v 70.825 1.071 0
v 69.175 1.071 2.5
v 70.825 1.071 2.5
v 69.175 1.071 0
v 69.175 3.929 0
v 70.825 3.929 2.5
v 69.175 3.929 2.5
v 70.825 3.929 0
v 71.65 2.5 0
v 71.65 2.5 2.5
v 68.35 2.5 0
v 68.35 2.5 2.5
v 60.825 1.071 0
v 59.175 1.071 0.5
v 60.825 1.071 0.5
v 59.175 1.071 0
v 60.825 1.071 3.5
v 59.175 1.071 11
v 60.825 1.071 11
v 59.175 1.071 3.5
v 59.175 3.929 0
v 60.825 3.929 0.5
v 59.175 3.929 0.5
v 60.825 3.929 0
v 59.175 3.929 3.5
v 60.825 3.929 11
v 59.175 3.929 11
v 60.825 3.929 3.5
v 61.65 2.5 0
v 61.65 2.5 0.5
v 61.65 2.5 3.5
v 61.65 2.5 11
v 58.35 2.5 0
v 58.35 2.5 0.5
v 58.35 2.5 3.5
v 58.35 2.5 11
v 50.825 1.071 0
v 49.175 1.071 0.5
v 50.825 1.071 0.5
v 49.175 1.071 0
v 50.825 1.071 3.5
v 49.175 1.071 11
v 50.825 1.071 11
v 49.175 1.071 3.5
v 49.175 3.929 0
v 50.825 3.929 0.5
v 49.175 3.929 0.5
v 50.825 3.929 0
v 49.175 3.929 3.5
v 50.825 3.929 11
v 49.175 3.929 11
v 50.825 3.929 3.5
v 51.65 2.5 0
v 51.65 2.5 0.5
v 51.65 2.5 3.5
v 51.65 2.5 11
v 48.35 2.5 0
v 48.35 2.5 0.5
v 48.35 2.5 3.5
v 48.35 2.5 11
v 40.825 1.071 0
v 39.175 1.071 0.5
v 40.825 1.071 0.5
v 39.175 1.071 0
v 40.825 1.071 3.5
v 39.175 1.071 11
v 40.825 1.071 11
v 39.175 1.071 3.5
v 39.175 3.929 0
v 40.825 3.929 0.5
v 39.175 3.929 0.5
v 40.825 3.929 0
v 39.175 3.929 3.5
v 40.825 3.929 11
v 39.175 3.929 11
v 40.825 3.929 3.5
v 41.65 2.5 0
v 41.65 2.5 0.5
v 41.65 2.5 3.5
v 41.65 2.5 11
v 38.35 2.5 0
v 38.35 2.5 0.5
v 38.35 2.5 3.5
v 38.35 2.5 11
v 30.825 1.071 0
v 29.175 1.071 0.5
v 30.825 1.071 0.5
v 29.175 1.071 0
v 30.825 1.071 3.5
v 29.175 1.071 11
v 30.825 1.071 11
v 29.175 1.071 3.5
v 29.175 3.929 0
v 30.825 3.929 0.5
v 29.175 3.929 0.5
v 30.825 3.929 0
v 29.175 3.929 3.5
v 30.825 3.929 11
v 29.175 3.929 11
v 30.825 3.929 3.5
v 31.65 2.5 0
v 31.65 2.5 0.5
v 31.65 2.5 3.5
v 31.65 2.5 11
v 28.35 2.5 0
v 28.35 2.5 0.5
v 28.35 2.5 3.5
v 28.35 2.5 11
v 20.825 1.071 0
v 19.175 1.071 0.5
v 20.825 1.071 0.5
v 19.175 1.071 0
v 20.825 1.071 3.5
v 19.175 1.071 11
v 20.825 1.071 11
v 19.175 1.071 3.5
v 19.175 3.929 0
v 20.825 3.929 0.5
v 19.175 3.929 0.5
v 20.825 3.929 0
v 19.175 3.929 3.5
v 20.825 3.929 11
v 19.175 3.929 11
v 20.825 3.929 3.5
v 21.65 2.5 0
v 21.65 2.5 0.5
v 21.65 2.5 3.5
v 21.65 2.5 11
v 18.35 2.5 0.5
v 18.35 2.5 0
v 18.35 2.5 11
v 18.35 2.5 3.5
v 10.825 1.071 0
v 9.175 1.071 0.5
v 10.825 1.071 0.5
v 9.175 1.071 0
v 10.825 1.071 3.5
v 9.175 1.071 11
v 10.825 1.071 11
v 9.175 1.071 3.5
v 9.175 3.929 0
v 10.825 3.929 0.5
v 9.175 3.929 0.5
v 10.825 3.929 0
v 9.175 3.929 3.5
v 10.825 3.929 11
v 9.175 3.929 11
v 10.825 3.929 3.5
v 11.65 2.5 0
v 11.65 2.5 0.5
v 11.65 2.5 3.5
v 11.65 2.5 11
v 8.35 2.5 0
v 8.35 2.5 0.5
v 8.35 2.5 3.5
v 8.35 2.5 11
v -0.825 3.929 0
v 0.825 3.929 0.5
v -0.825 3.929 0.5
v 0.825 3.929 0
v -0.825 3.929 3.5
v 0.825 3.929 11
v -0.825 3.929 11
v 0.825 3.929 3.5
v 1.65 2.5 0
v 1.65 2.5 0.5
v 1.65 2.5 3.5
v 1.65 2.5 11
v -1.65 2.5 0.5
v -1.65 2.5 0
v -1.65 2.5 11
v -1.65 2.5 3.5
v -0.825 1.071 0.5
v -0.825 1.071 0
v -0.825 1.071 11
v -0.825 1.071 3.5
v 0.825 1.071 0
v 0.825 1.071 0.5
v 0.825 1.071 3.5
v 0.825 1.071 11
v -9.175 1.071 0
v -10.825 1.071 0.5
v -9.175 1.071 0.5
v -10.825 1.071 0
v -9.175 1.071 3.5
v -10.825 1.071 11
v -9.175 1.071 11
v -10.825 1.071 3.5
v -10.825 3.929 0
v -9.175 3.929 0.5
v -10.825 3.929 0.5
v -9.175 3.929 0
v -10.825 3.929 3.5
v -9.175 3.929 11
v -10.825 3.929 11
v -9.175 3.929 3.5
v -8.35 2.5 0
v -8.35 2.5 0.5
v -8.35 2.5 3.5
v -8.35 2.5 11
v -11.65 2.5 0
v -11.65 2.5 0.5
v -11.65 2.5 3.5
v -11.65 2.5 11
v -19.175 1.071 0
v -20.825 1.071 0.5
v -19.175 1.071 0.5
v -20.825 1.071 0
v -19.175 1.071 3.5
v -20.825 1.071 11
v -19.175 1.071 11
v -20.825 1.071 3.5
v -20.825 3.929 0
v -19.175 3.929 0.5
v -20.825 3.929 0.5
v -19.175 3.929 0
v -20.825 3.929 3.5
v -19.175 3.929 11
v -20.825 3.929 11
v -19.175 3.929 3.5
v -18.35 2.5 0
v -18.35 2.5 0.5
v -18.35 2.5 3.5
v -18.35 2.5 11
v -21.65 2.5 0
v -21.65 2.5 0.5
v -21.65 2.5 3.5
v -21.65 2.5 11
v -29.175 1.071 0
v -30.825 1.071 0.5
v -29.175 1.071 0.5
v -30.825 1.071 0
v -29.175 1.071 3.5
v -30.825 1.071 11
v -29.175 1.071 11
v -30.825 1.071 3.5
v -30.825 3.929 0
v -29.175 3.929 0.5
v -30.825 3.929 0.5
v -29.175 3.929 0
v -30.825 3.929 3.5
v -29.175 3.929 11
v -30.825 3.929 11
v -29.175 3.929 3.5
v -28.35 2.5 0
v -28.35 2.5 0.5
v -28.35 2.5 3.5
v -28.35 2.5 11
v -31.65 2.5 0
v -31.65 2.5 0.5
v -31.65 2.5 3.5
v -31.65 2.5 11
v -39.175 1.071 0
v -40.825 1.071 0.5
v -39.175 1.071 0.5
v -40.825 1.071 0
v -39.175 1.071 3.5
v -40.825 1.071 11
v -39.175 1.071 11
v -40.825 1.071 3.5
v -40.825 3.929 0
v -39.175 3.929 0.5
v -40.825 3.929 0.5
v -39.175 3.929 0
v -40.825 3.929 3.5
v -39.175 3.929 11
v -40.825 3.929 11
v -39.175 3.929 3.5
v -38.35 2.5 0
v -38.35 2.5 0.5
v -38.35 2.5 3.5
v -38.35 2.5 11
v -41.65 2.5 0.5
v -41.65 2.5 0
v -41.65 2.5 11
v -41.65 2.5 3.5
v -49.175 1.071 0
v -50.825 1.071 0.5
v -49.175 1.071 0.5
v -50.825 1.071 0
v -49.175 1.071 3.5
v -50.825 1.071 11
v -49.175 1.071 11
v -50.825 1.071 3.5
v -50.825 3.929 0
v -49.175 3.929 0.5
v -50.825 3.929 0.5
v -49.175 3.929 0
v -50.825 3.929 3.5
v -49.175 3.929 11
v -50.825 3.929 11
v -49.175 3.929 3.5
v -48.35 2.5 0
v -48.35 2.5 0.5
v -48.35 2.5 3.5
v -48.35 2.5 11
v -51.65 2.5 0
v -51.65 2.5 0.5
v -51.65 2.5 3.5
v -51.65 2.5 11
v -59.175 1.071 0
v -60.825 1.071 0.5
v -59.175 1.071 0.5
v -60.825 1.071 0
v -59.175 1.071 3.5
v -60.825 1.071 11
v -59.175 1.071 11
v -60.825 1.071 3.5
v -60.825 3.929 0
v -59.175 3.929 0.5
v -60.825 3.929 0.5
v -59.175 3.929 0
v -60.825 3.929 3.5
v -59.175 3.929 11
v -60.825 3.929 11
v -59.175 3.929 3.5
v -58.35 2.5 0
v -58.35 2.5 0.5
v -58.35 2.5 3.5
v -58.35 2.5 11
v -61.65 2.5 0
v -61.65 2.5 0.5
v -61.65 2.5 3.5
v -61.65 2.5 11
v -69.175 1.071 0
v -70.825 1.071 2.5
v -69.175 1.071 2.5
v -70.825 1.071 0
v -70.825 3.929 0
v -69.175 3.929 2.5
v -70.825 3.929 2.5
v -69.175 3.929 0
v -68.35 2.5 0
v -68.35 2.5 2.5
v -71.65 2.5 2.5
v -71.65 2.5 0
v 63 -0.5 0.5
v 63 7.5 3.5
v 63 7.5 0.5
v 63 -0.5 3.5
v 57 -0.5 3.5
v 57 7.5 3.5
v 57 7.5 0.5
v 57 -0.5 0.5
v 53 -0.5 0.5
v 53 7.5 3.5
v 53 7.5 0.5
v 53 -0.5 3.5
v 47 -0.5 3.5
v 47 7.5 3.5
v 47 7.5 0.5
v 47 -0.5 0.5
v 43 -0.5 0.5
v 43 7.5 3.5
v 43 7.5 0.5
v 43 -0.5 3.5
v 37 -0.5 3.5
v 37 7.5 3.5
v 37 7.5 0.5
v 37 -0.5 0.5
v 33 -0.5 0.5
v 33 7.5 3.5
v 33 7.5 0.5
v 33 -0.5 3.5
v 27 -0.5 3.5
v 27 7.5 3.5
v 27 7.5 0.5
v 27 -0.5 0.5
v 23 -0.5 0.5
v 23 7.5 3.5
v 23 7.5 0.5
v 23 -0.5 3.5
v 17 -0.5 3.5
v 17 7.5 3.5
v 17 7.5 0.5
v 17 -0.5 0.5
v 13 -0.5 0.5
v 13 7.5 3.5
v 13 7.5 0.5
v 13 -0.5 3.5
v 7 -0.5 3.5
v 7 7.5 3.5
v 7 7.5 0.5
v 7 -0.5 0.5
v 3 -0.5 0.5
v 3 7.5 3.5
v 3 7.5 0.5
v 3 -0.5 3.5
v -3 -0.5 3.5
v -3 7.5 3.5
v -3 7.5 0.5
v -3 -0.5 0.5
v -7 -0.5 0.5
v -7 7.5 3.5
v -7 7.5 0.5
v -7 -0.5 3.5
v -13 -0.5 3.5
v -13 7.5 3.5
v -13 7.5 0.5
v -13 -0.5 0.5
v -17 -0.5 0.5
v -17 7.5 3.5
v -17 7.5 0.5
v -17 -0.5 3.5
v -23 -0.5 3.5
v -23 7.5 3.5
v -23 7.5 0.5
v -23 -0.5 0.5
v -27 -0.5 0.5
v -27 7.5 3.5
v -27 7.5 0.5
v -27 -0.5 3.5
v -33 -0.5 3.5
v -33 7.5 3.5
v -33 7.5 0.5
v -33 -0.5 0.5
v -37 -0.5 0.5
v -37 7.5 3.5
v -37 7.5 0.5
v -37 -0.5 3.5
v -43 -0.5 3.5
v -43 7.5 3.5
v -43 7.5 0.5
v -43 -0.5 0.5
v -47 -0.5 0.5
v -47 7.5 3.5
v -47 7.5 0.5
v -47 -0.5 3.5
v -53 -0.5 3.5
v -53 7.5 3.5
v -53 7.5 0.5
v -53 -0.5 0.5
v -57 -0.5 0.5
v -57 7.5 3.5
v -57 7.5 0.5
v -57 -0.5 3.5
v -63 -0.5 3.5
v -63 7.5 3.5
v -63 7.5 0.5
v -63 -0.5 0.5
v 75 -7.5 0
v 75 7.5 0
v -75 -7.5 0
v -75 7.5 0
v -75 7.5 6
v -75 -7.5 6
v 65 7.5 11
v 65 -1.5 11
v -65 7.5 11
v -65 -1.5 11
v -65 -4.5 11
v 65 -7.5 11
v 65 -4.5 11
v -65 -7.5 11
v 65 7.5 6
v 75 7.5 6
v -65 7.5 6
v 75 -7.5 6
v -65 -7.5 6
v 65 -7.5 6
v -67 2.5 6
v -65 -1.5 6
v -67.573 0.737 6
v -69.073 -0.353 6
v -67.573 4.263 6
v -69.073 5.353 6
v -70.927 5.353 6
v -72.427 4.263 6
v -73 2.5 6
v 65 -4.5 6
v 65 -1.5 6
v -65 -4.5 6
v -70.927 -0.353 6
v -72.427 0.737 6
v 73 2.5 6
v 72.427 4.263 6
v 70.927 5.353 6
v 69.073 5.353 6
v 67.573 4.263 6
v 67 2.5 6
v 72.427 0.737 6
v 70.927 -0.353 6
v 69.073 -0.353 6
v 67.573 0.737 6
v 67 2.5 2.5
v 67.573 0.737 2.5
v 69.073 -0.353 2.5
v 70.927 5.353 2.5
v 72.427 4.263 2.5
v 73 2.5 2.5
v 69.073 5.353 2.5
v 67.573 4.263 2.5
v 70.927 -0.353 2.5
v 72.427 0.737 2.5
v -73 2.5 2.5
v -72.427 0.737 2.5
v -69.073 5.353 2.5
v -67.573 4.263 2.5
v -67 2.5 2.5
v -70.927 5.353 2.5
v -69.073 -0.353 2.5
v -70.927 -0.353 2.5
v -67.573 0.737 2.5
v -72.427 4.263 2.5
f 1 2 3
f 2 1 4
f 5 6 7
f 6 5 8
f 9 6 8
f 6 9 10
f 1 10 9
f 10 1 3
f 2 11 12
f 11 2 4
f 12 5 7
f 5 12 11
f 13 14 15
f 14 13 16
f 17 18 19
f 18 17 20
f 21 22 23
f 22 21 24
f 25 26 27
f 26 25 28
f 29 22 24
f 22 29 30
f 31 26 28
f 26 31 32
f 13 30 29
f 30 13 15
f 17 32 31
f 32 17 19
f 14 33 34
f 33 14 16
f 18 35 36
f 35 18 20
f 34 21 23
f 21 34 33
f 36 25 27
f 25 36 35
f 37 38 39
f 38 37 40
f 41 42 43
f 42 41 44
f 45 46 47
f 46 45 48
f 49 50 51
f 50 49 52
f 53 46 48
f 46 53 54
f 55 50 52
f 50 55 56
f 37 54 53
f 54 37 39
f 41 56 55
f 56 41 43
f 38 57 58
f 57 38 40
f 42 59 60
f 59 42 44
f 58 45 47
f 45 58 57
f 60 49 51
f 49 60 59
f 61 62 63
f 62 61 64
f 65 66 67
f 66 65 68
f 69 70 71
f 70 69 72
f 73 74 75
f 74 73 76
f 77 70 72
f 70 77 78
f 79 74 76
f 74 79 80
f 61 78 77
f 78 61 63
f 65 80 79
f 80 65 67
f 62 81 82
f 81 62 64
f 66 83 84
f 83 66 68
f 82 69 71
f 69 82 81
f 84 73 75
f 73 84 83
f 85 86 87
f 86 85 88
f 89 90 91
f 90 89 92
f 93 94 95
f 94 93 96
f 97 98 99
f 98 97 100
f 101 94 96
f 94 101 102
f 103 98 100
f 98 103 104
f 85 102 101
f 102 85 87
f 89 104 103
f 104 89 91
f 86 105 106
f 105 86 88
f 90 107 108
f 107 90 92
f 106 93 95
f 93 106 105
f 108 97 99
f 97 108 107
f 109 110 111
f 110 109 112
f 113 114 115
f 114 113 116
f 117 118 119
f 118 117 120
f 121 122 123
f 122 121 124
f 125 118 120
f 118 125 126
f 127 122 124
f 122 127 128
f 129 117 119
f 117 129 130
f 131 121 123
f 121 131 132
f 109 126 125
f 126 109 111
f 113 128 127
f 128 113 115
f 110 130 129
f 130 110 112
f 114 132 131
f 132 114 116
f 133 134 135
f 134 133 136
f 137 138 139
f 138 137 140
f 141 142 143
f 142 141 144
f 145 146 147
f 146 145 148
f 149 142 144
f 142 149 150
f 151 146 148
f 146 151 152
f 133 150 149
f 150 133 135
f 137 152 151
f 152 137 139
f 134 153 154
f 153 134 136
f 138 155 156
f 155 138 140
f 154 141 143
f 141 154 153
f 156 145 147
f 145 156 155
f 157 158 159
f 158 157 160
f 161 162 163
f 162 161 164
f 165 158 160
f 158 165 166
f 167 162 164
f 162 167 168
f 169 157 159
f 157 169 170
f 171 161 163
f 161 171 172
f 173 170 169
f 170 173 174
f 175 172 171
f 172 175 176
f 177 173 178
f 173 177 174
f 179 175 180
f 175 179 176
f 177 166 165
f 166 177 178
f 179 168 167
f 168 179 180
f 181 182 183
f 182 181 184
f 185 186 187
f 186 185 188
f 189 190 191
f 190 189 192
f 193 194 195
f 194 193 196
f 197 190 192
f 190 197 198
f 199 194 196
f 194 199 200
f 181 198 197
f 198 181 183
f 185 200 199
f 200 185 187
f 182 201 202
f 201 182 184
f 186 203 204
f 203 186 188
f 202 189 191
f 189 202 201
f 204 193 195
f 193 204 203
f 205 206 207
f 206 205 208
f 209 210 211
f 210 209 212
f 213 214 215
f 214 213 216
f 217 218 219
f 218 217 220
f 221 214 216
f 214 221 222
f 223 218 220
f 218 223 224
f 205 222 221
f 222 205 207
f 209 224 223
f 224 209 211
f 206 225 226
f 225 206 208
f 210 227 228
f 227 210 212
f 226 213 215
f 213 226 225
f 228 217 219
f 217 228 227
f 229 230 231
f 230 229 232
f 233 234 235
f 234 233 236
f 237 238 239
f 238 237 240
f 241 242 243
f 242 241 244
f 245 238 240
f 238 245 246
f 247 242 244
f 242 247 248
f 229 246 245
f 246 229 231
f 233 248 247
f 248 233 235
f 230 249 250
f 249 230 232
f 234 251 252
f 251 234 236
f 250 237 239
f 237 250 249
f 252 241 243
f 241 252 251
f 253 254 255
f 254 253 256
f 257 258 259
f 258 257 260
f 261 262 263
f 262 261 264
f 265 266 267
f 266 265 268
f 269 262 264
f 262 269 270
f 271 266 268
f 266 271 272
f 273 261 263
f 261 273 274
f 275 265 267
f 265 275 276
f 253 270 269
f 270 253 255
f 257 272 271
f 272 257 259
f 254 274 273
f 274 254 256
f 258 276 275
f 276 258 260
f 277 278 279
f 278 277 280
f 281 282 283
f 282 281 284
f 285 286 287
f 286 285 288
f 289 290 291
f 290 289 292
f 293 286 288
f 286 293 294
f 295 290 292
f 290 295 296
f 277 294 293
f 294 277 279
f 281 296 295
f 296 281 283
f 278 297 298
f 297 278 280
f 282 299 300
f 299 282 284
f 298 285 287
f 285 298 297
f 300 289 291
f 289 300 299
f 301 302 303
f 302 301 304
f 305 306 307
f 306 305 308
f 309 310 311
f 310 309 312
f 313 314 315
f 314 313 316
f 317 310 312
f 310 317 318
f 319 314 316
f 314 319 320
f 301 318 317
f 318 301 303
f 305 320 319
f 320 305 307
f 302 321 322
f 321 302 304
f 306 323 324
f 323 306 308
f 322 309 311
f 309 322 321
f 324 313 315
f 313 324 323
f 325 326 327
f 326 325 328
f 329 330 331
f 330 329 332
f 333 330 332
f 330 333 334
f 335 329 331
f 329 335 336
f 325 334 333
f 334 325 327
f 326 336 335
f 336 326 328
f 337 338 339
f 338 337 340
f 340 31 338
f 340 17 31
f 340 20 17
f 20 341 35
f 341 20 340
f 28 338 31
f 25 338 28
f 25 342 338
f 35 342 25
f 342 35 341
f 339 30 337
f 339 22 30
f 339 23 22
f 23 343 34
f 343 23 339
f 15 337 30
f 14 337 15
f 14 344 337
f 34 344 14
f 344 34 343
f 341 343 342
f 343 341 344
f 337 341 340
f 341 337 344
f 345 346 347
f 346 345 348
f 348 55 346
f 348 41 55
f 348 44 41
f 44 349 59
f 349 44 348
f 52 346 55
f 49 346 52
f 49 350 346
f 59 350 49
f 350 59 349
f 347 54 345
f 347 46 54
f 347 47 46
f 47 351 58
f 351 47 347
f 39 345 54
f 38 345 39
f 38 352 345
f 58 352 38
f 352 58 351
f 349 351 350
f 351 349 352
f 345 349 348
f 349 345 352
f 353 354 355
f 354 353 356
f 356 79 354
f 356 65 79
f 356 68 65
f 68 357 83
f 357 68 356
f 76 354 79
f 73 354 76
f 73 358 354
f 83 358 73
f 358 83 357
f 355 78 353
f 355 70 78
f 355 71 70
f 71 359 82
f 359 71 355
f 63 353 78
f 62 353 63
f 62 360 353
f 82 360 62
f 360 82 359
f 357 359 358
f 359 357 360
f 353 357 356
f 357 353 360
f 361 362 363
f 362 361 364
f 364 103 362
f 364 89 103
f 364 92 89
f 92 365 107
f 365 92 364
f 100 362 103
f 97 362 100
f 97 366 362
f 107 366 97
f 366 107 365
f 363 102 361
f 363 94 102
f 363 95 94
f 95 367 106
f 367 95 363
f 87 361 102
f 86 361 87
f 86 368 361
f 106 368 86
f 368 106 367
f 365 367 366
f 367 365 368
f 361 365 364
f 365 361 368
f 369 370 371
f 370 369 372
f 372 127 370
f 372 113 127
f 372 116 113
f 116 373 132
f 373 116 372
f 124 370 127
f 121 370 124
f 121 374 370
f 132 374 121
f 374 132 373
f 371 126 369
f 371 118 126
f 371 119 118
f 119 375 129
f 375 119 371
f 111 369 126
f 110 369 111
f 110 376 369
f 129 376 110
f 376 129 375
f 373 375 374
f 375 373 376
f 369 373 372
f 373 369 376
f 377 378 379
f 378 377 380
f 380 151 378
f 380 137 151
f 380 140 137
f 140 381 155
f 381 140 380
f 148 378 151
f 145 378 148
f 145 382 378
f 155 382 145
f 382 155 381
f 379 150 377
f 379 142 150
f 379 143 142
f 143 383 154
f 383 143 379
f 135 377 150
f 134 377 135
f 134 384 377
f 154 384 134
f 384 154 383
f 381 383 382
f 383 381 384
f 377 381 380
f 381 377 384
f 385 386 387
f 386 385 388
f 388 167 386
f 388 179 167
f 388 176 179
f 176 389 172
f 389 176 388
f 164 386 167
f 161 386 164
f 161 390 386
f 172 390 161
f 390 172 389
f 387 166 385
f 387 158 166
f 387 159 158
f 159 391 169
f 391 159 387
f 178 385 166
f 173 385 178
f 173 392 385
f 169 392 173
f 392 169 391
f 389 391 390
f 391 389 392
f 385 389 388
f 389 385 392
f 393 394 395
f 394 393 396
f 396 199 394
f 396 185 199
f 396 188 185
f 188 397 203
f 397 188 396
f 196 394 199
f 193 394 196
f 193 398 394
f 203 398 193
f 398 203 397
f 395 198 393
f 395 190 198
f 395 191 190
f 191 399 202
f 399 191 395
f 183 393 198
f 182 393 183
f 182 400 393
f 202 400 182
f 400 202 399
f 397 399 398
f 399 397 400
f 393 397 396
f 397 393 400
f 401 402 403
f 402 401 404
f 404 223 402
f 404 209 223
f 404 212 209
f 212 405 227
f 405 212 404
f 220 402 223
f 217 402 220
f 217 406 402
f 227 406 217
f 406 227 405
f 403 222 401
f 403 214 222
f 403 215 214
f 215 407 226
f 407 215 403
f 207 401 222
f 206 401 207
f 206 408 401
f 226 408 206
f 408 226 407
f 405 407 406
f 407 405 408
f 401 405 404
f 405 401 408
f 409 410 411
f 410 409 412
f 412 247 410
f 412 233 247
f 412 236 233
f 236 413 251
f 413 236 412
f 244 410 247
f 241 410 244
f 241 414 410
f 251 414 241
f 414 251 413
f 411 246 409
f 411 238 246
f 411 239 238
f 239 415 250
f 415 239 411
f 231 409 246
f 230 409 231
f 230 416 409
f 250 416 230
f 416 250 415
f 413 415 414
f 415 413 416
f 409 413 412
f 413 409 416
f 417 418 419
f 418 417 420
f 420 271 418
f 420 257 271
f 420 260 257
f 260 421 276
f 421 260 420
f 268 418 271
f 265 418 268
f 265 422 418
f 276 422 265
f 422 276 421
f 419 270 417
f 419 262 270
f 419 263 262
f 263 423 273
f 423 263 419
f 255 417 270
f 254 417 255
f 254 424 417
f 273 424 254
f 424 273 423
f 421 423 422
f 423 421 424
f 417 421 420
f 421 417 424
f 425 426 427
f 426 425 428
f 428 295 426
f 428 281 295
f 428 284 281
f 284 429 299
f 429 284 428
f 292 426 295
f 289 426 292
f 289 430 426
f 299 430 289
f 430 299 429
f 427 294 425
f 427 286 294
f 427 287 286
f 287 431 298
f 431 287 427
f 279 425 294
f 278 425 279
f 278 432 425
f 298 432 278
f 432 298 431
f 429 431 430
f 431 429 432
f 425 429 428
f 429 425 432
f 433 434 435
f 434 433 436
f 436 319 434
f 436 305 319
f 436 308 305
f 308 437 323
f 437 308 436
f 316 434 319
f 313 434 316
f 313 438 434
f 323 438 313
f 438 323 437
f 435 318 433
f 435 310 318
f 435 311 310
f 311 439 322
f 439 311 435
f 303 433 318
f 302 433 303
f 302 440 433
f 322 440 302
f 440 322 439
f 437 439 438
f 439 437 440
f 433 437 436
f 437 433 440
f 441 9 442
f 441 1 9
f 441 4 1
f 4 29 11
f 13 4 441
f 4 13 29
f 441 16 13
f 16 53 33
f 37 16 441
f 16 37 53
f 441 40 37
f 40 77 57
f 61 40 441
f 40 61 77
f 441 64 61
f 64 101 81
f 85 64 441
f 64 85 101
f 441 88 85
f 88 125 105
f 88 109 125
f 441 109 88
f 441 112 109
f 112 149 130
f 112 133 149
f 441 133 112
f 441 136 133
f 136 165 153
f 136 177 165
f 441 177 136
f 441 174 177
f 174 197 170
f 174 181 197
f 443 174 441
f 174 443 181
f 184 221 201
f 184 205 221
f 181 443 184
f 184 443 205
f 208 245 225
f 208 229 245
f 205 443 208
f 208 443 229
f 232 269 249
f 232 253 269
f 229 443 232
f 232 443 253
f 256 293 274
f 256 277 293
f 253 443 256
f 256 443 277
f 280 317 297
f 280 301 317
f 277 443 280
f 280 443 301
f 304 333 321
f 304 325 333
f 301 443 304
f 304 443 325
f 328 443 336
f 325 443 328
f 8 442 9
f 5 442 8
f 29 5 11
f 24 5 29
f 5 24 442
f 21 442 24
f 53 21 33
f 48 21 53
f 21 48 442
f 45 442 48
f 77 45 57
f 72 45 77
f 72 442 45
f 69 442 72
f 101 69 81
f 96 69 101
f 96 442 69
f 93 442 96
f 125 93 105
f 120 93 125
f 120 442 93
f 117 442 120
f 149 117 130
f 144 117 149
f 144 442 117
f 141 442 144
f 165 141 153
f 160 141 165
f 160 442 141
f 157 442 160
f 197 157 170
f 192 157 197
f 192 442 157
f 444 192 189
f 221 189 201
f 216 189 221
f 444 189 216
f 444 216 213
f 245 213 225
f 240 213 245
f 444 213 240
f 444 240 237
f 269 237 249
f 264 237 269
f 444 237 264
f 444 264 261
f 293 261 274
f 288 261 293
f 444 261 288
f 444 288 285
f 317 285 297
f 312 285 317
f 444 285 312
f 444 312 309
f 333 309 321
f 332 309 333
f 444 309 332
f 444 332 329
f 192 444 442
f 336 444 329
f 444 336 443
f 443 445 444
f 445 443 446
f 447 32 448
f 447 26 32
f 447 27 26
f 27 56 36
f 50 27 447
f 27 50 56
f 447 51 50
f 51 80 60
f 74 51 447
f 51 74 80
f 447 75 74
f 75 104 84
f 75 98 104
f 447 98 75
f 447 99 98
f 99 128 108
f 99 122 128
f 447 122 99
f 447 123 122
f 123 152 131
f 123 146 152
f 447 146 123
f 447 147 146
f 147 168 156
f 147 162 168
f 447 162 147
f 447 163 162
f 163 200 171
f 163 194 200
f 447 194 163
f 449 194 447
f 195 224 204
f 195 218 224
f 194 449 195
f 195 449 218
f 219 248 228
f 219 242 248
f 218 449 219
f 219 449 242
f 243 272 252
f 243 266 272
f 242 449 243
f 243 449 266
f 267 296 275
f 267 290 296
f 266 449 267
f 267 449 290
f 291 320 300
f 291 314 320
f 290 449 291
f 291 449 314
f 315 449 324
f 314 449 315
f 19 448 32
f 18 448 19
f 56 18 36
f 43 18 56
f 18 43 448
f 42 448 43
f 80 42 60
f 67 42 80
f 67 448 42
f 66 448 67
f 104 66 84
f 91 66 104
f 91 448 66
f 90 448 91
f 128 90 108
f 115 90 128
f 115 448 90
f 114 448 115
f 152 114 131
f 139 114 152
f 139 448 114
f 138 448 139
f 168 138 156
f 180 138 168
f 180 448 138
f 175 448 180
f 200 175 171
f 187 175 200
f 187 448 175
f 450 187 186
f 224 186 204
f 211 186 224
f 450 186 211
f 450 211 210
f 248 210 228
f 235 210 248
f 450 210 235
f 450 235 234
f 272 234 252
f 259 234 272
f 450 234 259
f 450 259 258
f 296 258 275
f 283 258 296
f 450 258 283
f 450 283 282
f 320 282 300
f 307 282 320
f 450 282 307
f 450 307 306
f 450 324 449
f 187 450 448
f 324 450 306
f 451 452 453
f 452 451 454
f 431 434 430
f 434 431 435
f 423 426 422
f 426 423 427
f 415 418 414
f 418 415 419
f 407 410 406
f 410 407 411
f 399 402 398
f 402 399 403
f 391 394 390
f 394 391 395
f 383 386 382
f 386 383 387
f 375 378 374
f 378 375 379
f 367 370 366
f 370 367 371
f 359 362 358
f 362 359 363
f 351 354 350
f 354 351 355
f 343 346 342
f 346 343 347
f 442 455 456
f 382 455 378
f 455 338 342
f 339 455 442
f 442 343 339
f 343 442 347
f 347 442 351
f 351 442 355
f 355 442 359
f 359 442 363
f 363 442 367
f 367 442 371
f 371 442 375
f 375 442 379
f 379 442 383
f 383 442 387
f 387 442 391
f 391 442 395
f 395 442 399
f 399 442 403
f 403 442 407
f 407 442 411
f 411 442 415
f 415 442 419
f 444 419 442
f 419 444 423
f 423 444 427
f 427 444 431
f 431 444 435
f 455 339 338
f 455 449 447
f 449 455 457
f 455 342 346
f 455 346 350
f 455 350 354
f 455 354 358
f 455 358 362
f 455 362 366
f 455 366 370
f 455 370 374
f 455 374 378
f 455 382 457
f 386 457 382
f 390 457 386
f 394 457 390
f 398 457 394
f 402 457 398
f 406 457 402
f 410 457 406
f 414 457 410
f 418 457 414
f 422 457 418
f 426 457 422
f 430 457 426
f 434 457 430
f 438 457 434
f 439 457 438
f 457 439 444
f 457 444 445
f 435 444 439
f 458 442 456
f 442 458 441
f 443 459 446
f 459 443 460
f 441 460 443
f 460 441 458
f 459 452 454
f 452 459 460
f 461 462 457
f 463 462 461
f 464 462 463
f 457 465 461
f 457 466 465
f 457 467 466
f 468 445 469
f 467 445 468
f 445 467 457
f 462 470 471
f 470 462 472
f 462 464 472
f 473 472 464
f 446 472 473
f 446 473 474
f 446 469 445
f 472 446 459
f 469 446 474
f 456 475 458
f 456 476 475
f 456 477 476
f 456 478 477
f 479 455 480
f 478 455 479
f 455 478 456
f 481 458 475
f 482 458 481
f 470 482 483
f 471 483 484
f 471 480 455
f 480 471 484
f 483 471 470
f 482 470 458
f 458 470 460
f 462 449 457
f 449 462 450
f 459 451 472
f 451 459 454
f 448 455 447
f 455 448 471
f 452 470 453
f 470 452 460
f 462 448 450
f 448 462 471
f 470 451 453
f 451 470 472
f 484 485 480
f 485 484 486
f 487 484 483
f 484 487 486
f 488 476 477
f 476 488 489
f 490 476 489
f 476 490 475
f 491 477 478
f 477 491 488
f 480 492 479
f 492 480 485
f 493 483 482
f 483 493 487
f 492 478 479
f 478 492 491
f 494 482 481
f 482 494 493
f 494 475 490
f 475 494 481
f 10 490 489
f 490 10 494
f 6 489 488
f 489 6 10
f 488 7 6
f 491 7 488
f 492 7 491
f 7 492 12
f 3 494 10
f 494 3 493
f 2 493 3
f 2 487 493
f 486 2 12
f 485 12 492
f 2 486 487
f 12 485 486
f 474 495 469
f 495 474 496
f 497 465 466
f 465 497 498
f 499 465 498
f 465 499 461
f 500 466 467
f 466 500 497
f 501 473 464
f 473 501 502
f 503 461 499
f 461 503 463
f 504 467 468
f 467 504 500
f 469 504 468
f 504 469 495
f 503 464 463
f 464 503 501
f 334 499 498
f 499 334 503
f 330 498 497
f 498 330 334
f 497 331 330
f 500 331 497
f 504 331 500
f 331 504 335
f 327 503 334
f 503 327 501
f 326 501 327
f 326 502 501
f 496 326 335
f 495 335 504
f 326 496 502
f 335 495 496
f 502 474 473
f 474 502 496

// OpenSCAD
vzdalenost_der = 10; //rozteč děr mezi sebou
pocet_der = 14; //pocet ter pres ktere je lista ponížené o 1

//rozměry výrezu
//rozmer v ose y
vzdalenost_od_okraje = 10; //vzdalenost stredu upevnovaci diry od kraje desky
vzdalenost_od_diry = 5; //vzdalenost od stredu upevnovaci diry na druhou stranu

//rozmery vyrezu v ose x
vzdalenost_1 = 5; //od díry ke kraji
vzdalenost_2 = 5;

//definicce celkové výšky lišty
zapust=6; //závislé na sloupku
vyska_listy=5;

//parametry pro úžlabinu
tlouska_celicka = 3; //definuje uzlabinu
sirka_materialu = 3; //sirka materialu od kraje desky k uzlabine

//parametry šroubu
vyska_hlavy = 3.5;
prumer_hlavy=6;
prumer_sroubu=3.3;

//parametry matice
prumer_matice=6; //hrany k hraně
vyska_matice=3;  //vyska matice
posuv_dorazu=0;  //pro moznost posuvu dorazu pro vsunutí matice
matice_sila_materialu=2; //sila materialu pod maticí na ose z

difference () {
color("cyan")
    translate([0, 0, 0])
        linear_extrude(height = zapust+vyska_listy)
            square([((pocet_der*vzdalenost_der)+2*vzdalenost_1), vzdalenost_od_okraje+vzdalenost_od_diry], center = true); 
    
    translate([-((((pocet_der*vzdalenost_der)+2*vzdalenost_1)/2)-(vzdalenost_1+vzdalenost_2/2)), 0, (zapust)])
        linear_extrude(height = vyska_listy)
            square([vzdalenost_2, vzdalenost_od_okraje+vzdalenost_od_diry], center = true); 
    
    translate([((((pocet_der*vzdalenost_der)+2*vzdalenost_1)/2)-(vzdalenost_1+vzdalenost_2/2)), 0, (zapust)])
        linear_extrude(height = vyska_listy)
            square([vzdalenost_2, vzdalenost_od_okraje+vzdalenost_od_diry], center = true); 
    
    translate([-((((pocet_der*vzdalenost_der)+2*vzdalenost_1)/2)-(vzdalenost_1/2)), 0, (zapust)])
        linear_extrude(height = vyska_listy)
            square([vzdalenost_1, vzdalenost_od_okraje+vzdalenost_od_diry], center = true); 
    
    translate([((((pocet_der*vzdalenost_der)+2*vzdalenost_1)/2)-(vzdalenost_1/2)), 0, (zapust)])
        linear_extrude(height = vyska_listy)
            square([vzdalenost_1, vzdalenost_od_okraje+vzdalenost_od_diry], center = true); 
    
     translate([0,-((((vzdalenost_od_okraje+vzdalenost_od_diry)/2)-sirka_materialu)-(tlouska_celicka/2)), zapust])
        linear_extrude(height = vyska_listy)
            square([((pocet_der*vzdalenost_der)+2*vzdalenost_1), tlouska_celicka], center = true); 
   
    
    //otvory pro hlavy sroubu
    
    translate([vzdalenost_der*pocet_der/2,-(((vzdalenost_od_okraje+vzdalenost_od_diry)/2)-vzdalenost_od_okraje),(zapust-vyska_hlavy)+vyska_hlavy/2])  // center top screw
        cylinder(vyska_hlavy, d=prumer_hlavy, center=true);
        
     translate([-vzdalenost_der*pocet_der/2,-(((vzdalenost_od_okraje+vzdalenost_od_diry)/2)-vzdalenost_od_okraje),(zapust-vyska_hlavy)+vyska_hlavy/2])  // center top screw
        cylinder(vyska_hlavy, d=prumer_hlavy, center=true);
 
//otvory pro srouby

 for (i = [0:1:pocet_der]) {      
 translate([(-i*vzdalenost_der)+vzdalenost_der*pocet_der/2,-(((vzdalenost_od_okraje+vzdalenost_od_diry)/2)-vzdalenost_od_okraje),(zapust-vyska_hlavy)+vyska_hlavy/2])  // center top screw
        cylinder((2*(zapust+vyska_listy)), d=prumer_sroubu, center=true); 
      }
//otvory pro matice
     
 for (i = [1:1:(pocet_der-1)]) {      
 translate([(-i*vzdalenost_der)+vzdalenost_der*pocet_der/2,-((((vzdalenost_od_okraje+vzdalenost_od_diry)/2)-vzdalenost_od_okraje)-((((prumer_matice+posuv_dorazu+vzdalenost_od_diry)/2))-(prumer_matice+posuv_dorazu)/2)),matice_sila_materialu])  // center top screw
      cube([prumer_matice, prumer_matice+posuv_dorazu+vzdalenost_od_diry,vyska_matice], center = true);
  
     }       
        
        
        
         }
         
       
